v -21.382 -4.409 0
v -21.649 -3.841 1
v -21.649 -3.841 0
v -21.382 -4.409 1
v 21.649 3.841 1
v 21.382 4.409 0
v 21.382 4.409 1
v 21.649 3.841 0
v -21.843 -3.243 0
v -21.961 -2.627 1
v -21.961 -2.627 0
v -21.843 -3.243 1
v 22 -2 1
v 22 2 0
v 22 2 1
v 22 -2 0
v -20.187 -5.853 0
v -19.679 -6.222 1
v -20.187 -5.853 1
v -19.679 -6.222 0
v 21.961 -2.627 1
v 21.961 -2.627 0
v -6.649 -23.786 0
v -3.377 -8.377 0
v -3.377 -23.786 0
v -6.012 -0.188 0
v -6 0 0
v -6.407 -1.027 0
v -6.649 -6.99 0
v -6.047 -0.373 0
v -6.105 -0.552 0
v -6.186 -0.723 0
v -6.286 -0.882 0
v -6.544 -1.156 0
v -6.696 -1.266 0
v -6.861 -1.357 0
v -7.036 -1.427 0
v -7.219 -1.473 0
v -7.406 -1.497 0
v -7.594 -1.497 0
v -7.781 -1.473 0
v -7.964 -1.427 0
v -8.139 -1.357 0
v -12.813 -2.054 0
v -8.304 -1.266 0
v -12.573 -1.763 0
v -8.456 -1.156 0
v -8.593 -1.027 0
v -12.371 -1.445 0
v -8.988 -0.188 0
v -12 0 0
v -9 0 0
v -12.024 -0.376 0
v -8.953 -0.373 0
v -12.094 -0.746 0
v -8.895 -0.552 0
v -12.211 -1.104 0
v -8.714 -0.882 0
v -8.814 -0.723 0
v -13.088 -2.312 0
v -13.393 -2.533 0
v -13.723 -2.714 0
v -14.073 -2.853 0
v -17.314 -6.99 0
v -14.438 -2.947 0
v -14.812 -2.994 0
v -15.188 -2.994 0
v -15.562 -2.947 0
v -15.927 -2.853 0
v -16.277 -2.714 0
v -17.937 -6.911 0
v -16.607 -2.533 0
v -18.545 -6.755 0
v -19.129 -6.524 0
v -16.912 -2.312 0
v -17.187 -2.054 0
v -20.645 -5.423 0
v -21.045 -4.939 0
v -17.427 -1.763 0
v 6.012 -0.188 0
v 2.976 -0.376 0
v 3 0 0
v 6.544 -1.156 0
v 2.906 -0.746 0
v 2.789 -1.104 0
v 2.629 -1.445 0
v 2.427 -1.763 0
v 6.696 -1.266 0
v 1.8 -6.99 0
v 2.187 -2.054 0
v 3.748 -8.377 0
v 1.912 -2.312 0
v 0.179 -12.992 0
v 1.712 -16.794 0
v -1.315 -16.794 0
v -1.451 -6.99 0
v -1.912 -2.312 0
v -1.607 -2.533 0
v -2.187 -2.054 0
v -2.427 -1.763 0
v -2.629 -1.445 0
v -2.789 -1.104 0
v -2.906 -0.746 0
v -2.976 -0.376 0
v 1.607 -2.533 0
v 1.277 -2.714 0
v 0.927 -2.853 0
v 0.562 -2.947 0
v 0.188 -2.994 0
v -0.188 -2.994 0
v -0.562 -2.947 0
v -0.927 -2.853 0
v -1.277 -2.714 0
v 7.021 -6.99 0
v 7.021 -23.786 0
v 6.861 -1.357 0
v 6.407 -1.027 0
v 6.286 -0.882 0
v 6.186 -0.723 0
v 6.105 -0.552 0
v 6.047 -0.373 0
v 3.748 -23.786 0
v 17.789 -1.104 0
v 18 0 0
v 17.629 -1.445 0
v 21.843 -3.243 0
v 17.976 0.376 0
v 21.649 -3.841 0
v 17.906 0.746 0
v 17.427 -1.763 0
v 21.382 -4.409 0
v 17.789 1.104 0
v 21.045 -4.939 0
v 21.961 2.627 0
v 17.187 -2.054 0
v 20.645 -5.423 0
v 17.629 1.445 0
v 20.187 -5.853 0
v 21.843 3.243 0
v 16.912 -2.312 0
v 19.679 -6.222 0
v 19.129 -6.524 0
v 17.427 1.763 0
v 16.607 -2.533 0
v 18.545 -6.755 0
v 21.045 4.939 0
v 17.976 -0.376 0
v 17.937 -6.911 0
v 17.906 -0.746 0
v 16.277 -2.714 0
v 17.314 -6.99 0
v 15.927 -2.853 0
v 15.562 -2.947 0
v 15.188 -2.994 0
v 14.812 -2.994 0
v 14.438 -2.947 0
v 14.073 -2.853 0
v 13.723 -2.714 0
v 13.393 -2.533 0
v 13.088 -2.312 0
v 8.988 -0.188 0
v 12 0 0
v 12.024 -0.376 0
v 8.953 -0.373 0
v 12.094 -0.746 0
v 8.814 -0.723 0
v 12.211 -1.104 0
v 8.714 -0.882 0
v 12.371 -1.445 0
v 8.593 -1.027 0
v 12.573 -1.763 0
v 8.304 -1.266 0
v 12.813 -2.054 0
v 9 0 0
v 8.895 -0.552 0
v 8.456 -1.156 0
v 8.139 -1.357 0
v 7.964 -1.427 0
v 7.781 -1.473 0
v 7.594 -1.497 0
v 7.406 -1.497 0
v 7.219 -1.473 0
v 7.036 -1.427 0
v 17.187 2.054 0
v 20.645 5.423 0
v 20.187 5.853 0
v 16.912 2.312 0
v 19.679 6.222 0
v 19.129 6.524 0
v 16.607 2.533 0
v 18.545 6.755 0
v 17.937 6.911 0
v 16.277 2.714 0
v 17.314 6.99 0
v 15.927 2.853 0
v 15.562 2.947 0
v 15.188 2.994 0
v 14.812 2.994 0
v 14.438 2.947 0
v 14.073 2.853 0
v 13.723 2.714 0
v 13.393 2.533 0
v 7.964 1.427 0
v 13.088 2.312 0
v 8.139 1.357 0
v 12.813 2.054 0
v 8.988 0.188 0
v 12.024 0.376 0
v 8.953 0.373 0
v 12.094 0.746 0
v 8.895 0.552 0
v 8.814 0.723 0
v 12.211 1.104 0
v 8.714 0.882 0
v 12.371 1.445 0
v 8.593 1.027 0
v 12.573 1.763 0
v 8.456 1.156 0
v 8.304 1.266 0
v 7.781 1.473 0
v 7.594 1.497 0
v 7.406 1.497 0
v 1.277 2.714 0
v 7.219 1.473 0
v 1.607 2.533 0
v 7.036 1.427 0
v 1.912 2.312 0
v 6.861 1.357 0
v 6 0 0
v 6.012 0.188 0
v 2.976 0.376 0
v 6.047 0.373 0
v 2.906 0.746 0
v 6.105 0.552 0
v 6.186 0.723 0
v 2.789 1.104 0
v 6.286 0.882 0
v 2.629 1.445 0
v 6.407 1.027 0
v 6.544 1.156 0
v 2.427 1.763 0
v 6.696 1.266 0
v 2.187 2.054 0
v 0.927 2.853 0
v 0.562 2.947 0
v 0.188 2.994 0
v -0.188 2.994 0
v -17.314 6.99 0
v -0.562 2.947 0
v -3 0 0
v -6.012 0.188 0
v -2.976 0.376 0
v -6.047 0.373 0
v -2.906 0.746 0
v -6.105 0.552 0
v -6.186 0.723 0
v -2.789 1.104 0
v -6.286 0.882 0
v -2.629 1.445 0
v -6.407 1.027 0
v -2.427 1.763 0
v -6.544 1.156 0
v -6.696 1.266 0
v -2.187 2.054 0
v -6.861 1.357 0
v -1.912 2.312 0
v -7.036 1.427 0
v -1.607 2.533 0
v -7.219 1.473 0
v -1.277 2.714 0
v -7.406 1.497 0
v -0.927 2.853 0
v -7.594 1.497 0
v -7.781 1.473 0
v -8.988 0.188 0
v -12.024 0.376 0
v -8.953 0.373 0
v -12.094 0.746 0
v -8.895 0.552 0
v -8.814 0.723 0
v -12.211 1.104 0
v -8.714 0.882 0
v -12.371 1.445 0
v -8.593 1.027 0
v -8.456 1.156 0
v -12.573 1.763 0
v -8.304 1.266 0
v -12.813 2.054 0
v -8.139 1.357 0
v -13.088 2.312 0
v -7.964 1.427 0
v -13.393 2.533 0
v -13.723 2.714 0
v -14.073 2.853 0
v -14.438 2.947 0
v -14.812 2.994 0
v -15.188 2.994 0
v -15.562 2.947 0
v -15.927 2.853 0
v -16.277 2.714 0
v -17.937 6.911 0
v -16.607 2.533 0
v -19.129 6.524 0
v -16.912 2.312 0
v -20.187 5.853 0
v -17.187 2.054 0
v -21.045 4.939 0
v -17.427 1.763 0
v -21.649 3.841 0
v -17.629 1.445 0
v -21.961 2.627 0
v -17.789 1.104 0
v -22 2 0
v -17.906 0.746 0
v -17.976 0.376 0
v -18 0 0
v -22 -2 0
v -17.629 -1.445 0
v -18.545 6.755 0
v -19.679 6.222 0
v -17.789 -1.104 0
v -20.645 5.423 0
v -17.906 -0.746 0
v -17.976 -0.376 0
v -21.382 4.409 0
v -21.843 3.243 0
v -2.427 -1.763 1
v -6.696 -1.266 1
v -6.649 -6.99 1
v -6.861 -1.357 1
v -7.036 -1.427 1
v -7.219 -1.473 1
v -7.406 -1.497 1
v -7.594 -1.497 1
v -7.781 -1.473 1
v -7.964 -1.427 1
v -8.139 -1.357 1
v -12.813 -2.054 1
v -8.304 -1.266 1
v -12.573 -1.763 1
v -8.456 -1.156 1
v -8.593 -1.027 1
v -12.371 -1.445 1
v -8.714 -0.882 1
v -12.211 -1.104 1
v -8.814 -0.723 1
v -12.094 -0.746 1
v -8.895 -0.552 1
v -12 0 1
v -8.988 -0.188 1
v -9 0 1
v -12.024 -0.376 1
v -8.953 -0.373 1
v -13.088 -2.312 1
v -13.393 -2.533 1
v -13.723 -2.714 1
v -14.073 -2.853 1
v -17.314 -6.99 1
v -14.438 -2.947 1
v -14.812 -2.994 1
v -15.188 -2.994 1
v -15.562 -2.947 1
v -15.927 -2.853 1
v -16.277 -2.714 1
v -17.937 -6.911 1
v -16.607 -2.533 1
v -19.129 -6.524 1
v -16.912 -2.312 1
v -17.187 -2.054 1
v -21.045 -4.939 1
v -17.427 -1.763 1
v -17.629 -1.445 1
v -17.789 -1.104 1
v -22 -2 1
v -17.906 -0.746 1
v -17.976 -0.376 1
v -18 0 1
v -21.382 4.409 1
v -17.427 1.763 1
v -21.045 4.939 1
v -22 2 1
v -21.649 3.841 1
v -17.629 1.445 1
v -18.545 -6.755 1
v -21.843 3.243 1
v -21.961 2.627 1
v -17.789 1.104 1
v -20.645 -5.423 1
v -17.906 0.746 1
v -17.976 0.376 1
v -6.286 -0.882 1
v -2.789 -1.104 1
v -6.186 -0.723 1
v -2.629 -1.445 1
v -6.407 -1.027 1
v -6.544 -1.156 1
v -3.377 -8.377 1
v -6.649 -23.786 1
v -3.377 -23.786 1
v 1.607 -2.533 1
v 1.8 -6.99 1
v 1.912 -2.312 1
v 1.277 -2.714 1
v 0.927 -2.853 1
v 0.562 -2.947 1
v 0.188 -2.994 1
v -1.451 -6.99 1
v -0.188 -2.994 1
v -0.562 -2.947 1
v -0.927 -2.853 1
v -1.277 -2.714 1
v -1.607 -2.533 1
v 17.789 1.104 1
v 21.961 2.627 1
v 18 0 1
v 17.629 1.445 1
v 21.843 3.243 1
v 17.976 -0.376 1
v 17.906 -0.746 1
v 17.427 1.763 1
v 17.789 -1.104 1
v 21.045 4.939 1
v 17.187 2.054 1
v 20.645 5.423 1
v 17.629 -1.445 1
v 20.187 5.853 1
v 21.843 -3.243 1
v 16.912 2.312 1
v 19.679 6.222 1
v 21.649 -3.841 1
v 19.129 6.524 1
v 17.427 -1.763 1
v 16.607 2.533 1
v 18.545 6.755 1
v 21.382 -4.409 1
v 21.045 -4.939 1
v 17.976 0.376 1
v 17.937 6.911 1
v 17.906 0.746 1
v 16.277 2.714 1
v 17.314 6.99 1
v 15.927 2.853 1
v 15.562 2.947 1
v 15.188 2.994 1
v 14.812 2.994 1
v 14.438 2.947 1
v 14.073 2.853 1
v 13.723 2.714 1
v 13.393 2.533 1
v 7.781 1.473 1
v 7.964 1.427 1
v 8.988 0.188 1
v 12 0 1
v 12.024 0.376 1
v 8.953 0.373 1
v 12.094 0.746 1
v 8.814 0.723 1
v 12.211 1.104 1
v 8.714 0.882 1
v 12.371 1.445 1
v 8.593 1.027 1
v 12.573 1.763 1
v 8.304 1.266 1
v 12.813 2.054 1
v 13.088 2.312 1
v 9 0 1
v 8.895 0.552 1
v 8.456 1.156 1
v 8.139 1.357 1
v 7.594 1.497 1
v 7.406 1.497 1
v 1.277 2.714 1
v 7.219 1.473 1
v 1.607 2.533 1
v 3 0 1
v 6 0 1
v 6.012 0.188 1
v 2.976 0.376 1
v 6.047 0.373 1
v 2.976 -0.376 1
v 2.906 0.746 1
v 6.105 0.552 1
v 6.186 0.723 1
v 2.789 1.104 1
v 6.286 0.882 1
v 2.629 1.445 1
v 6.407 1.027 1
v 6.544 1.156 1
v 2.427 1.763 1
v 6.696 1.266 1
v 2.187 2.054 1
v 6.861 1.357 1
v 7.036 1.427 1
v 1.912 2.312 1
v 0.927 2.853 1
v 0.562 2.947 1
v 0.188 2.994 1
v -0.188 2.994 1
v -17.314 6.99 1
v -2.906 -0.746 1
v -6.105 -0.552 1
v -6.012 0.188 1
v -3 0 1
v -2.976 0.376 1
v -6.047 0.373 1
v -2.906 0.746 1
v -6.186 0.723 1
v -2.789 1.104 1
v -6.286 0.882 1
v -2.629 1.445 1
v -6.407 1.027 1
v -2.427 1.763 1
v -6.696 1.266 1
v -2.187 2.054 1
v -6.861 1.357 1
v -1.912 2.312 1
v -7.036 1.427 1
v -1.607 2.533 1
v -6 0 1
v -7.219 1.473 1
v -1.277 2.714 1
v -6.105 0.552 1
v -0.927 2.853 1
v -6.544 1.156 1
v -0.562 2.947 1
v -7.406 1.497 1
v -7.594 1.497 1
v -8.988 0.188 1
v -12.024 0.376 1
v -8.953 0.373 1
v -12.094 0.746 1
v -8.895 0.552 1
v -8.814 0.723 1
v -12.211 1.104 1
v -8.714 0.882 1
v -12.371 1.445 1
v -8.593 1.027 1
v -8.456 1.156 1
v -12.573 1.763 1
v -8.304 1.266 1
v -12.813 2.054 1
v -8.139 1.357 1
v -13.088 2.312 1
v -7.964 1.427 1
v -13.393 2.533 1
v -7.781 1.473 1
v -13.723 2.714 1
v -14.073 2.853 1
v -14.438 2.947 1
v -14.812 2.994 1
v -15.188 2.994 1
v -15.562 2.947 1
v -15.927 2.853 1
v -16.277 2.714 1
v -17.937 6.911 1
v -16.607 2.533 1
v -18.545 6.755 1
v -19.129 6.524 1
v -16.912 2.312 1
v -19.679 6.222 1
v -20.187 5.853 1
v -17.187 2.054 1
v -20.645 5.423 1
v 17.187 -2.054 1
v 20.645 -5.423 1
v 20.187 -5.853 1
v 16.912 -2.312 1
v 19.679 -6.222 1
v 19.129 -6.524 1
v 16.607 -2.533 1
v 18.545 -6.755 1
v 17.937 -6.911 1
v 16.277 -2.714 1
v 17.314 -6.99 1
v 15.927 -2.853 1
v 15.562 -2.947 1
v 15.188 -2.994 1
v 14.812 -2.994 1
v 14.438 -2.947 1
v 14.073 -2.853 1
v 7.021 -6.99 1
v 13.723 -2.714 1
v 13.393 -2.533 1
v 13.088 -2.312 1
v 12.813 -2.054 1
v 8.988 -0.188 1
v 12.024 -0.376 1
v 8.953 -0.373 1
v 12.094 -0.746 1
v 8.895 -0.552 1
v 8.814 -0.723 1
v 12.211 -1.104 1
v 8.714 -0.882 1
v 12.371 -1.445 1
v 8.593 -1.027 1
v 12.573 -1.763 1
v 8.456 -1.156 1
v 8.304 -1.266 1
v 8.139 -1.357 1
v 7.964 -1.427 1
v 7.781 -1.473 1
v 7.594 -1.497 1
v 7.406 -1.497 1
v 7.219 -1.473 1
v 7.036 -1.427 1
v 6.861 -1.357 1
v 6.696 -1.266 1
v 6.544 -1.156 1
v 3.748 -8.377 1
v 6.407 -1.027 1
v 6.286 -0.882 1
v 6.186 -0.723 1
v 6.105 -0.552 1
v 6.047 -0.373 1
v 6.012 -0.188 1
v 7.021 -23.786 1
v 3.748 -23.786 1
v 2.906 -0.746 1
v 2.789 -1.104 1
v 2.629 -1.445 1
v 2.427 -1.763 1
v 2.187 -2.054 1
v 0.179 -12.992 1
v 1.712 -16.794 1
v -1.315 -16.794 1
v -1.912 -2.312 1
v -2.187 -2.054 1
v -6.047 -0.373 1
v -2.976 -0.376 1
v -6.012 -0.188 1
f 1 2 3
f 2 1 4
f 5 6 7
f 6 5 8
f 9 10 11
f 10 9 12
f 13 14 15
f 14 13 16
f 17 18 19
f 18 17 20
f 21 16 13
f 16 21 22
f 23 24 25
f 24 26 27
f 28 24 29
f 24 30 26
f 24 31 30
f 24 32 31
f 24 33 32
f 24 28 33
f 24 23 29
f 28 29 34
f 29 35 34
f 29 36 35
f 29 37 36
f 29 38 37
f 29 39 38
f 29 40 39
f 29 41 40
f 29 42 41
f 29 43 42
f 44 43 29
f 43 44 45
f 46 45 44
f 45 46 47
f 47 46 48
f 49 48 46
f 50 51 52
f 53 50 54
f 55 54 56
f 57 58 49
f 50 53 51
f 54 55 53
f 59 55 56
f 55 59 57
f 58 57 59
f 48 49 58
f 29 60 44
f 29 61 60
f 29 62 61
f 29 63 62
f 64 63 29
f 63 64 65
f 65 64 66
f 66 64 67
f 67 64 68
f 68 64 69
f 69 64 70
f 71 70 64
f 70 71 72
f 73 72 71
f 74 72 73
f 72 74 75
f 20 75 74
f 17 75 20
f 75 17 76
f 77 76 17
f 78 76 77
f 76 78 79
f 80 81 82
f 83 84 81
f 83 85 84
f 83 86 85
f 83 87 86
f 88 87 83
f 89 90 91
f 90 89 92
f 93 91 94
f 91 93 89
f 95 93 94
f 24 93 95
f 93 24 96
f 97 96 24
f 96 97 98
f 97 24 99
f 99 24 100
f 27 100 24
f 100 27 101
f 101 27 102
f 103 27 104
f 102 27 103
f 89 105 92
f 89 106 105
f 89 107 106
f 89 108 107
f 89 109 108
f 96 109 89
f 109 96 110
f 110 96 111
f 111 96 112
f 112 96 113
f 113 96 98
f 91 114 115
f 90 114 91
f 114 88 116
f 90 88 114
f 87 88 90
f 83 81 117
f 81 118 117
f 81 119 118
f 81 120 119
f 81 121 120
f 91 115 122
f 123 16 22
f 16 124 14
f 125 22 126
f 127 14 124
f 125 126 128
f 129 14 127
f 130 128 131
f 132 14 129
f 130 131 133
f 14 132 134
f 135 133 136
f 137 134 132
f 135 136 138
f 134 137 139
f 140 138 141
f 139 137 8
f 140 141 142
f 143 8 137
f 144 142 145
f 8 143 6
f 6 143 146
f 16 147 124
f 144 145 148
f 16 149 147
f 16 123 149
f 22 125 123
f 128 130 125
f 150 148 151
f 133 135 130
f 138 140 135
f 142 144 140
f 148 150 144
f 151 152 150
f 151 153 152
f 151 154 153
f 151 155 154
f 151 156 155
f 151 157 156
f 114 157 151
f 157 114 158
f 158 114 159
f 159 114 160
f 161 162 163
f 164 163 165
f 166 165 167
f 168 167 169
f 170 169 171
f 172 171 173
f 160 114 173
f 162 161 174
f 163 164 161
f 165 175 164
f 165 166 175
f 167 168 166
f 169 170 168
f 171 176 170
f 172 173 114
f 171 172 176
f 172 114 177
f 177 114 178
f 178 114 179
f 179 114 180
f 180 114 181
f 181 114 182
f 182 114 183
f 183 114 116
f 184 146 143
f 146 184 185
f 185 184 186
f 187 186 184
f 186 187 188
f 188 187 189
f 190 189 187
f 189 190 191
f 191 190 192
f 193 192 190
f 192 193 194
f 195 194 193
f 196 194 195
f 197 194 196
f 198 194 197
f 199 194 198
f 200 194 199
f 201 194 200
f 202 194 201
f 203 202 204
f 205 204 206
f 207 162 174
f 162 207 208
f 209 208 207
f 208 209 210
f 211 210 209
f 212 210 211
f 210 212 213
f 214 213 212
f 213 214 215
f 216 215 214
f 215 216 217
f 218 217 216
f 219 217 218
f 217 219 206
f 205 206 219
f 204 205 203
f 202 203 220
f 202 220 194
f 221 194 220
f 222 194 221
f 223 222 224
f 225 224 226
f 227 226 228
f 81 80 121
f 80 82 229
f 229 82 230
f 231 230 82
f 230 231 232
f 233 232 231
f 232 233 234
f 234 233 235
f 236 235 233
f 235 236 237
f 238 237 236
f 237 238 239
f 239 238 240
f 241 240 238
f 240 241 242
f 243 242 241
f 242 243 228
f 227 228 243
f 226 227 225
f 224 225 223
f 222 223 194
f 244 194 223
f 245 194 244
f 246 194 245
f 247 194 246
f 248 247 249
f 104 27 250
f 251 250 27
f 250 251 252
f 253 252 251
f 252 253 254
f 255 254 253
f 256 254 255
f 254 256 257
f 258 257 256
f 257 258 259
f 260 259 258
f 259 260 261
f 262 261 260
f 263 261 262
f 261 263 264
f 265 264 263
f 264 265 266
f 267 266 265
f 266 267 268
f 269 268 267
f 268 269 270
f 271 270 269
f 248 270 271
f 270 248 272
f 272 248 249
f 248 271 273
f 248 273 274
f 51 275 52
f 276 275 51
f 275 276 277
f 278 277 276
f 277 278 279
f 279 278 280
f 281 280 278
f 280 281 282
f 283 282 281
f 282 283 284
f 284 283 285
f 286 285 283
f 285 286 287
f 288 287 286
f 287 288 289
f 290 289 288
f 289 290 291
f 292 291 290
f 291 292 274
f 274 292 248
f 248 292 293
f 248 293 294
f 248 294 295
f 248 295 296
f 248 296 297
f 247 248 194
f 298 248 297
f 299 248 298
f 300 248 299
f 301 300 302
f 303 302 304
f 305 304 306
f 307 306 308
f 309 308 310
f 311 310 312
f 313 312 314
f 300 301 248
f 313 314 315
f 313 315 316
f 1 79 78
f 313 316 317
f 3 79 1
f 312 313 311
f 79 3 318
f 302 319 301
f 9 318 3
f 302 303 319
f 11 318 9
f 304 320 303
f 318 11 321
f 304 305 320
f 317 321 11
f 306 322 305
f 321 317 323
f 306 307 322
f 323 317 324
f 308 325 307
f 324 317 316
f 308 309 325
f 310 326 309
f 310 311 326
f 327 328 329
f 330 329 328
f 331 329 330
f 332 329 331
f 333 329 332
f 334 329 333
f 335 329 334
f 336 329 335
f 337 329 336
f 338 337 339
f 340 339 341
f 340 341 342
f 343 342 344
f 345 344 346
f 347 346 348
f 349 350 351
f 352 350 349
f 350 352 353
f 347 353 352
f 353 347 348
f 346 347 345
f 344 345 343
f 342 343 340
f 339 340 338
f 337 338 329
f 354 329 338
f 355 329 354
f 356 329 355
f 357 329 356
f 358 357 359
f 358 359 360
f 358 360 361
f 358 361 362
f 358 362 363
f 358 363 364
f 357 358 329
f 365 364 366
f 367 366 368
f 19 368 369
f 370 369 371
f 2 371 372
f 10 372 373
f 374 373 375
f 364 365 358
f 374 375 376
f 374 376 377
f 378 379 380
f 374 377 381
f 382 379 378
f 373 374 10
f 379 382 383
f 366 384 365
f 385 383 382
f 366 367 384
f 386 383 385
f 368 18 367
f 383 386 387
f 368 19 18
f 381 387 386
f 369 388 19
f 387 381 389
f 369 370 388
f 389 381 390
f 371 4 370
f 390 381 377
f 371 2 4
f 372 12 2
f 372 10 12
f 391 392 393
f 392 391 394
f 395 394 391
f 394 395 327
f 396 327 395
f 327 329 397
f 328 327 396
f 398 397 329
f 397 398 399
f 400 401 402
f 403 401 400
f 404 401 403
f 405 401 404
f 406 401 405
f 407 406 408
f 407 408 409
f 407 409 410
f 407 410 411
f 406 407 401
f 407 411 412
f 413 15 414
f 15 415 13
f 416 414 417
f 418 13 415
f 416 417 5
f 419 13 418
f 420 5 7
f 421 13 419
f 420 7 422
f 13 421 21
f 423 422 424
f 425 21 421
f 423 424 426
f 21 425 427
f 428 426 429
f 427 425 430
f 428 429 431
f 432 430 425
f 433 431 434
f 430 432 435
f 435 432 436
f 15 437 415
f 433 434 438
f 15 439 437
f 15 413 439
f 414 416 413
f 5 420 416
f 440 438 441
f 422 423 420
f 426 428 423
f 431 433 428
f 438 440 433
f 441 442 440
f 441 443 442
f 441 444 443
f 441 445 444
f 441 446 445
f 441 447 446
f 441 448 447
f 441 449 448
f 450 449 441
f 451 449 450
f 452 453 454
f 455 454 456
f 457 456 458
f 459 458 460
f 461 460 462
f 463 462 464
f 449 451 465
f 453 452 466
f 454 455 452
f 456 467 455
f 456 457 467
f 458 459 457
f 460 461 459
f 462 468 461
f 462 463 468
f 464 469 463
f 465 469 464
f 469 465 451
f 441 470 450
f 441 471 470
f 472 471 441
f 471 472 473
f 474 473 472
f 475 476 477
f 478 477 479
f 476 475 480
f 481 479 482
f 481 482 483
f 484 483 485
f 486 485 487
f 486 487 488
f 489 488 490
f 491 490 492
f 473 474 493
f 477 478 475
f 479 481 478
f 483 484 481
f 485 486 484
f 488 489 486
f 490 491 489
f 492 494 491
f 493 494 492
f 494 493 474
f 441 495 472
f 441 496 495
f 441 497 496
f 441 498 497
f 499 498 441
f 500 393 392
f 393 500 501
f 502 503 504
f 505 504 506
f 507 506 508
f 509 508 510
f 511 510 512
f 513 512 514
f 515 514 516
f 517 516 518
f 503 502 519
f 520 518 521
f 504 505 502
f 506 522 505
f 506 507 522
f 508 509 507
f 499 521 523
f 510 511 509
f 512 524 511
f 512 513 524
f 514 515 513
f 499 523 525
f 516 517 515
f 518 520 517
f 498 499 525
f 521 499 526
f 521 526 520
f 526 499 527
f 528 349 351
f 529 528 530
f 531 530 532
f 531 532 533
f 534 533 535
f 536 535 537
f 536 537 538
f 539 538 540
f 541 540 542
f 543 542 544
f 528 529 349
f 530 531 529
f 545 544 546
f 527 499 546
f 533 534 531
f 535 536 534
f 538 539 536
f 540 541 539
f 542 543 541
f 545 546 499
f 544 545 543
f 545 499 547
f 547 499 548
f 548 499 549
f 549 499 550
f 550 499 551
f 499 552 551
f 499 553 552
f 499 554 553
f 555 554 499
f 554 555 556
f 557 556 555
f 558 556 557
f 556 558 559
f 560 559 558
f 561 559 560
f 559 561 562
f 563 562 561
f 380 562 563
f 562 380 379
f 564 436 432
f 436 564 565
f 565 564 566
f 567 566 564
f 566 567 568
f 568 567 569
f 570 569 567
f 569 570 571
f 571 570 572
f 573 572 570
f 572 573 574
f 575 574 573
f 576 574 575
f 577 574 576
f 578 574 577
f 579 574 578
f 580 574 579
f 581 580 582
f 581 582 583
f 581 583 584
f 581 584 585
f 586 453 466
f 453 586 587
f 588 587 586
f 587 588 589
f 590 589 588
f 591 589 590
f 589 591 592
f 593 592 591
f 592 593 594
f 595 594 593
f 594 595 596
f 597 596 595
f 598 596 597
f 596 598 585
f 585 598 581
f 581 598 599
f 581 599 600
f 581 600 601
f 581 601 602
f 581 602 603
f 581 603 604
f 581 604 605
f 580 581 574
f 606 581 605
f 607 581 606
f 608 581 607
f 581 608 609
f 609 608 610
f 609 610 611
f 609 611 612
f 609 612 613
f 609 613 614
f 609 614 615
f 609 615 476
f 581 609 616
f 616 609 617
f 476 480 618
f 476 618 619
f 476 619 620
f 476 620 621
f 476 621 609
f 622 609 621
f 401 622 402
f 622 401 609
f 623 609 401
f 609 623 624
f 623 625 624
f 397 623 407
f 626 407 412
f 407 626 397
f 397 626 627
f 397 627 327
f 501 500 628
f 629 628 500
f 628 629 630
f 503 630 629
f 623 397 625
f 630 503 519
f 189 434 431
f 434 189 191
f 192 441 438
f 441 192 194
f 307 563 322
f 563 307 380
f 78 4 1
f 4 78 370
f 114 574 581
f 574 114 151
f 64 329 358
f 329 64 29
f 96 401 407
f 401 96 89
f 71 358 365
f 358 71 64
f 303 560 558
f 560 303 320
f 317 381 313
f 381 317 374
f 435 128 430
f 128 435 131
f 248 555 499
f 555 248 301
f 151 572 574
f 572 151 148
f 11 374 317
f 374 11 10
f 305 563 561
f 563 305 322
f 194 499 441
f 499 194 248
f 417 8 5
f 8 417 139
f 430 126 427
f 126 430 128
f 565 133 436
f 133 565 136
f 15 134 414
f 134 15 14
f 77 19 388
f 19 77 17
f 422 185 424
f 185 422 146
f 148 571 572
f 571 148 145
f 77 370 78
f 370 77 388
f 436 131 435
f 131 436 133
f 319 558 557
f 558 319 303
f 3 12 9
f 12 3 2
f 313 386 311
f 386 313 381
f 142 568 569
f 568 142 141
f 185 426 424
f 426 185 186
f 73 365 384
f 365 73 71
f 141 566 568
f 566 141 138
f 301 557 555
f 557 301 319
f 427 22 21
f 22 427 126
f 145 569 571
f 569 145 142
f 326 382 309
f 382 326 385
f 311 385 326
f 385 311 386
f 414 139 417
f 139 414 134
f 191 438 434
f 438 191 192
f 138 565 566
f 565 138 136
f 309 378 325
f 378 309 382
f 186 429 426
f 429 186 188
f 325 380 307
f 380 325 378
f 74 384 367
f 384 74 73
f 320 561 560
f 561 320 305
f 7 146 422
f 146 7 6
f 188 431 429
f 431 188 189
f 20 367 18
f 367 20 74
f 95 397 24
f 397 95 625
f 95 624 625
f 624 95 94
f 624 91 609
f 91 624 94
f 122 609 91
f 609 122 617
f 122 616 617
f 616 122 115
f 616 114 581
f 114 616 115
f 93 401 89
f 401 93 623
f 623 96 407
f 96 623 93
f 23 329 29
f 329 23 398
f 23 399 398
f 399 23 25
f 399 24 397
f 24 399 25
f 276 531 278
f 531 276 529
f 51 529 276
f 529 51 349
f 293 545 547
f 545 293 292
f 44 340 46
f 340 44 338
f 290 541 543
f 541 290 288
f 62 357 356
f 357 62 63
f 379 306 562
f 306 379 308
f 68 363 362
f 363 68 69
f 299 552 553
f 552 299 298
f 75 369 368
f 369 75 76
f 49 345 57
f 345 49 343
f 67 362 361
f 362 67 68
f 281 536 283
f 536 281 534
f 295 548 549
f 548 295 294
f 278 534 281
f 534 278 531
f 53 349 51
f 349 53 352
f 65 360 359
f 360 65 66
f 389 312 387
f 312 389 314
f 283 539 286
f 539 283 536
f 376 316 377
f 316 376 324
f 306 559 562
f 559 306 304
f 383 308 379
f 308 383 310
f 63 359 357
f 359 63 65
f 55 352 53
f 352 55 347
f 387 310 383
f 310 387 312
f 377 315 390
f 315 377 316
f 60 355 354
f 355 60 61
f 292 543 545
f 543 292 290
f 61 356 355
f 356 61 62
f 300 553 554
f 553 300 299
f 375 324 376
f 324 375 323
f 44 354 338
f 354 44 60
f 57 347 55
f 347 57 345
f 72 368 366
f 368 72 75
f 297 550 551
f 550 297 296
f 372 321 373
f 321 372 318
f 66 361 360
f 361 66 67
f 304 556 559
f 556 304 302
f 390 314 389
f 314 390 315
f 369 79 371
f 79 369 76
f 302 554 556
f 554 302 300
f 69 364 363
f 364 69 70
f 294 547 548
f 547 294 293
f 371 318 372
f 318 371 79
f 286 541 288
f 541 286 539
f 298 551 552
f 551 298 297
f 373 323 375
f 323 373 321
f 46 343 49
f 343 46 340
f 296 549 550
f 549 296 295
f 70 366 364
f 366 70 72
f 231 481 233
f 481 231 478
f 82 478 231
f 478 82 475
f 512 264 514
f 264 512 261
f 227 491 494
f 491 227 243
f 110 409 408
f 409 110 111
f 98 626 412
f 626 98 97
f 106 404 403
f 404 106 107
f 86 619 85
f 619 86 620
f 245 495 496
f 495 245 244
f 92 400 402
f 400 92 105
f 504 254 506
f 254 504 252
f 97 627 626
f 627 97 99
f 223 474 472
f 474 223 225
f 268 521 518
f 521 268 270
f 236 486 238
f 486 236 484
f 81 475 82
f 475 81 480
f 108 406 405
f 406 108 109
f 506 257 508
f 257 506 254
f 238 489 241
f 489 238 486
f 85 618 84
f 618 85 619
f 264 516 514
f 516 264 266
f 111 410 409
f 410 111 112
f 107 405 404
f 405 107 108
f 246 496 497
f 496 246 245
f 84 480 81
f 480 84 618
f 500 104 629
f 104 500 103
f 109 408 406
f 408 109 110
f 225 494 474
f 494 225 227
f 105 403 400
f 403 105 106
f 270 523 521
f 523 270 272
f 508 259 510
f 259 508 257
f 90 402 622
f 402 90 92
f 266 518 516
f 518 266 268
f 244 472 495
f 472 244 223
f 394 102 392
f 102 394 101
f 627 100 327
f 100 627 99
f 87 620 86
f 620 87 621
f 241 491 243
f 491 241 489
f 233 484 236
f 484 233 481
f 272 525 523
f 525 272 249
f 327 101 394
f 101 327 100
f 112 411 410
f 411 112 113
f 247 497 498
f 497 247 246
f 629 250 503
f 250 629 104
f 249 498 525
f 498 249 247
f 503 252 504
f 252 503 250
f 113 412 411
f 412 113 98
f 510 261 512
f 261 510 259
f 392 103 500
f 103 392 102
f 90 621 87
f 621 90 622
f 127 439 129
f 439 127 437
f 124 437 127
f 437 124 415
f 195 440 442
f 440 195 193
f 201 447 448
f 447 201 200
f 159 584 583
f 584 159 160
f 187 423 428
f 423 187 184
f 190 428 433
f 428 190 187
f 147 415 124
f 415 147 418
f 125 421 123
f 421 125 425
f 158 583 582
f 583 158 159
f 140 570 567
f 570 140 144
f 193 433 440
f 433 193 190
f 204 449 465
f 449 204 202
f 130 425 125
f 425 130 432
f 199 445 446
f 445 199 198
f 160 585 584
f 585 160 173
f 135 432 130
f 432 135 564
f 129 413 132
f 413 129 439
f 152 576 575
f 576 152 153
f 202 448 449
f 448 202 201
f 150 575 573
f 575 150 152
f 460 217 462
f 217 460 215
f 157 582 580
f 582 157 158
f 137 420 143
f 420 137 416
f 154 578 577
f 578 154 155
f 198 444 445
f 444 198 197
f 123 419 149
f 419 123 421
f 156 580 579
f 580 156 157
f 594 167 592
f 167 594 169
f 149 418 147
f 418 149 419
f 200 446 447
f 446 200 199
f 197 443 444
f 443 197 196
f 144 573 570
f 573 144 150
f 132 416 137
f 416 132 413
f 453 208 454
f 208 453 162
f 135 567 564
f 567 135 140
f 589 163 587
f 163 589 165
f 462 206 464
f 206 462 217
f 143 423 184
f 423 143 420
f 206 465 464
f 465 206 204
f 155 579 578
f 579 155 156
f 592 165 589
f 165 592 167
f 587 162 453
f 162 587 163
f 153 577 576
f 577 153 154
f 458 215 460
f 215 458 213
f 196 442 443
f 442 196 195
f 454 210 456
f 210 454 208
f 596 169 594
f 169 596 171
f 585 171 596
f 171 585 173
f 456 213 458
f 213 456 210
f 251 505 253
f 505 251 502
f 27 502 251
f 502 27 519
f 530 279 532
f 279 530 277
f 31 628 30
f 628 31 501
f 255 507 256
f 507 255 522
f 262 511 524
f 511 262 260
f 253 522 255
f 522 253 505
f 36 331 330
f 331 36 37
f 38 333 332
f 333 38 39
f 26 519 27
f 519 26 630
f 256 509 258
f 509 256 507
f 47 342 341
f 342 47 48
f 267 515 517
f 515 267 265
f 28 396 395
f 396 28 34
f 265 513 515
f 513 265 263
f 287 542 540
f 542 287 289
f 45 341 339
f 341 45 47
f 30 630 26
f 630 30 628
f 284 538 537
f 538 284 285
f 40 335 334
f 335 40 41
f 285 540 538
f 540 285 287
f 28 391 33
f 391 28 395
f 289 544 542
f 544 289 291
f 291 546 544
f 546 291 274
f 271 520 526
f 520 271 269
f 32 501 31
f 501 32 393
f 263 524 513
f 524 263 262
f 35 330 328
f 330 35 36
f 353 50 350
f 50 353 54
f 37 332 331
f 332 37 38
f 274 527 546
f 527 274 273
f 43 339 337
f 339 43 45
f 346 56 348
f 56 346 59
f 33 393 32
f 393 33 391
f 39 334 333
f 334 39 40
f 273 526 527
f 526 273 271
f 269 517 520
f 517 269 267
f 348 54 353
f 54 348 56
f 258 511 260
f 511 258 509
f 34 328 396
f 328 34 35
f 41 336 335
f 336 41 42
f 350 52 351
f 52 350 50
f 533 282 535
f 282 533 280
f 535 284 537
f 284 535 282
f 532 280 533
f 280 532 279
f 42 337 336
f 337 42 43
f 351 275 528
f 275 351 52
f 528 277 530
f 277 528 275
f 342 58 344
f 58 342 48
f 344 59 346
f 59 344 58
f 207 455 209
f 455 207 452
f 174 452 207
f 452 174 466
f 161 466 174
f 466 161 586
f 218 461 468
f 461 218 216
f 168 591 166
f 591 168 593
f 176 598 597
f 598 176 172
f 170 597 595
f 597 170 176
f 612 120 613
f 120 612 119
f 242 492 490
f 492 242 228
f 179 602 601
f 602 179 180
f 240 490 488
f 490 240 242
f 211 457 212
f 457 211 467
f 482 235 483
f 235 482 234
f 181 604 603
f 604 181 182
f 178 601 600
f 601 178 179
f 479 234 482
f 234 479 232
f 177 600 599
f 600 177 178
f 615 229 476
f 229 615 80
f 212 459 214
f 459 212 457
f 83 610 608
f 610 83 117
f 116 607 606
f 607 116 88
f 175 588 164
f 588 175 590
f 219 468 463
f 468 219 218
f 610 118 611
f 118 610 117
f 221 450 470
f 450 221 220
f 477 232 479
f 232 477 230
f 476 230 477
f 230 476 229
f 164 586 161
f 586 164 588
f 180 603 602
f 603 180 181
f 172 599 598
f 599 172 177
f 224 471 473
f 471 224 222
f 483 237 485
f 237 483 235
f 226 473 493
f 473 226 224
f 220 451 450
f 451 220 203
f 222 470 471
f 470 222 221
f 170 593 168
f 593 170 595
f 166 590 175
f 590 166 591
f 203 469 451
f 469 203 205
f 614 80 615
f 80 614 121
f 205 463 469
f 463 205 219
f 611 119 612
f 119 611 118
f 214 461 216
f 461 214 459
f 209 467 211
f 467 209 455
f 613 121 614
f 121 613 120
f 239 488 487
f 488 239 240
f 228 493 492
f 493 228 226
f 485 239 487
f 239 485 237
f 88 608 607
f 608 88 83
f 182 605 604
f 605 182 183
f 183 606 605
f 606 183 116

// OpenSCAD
$fn = 50;


difference() {
	union() {
		hull() {
			translate(v = [-17.0000000000, 2.0000000000, 0]) {
				cylinder(h = 1, r = 5);
			}
			translate(v = [17.0000000000, 2.0000000000, 0]) {
				cylinder(h = 1, r = 5);
			}
			translate(v = [-17.0000000000, -2.0000000000, 0]) {
				cylinder(h = 1, r = 5);
			}
			translate(v = [17.0000000000, -2.0000000000, 0]) {
				cylinder(h = 1, r = 5);
			}
		}
		translate(v = [0, -5, 0]) {
			linear_extrude(height = 1) {
				text(font = "DejaVu Sans Mono:style=Bold", halign = "center", size = 19.0000000000, text = "M", valign = "top");
			}
		}
	}
	union() {
		translate(v = [-15.0000000000, 0.0000000000, 0]) {
			translate(v = [0, 0, -100]) {
				cylinder(h = 200, r = 3.0000000000);
			}
		}
		translate(v = [0, 0, -100]) {
			cylinder(h = 200, r = 3.0000000000);
		}
		translate(v = [15.0000000000, 0.0000000000, 0]) {
			translate(v = [0, 0, -100]) {
				cylinder(h = 200, r = 3.0000000000);
			}
		}
		translate(v = [-15.0000000000, 0.0000000000, 0]) {
			translate(v = [0, 0, -100]) {
				cylinder(h = 200, r = 1.5000000000);
			}
		}
		translate(v = [-7.5000000000, 0.0000000000, 0]) {
			translate(v = [0, 0, -100]) {
				cylinder(h = 200, r = 1.5000000000);
			}
		}
		translate(v = [0, 0, -100]) {
			cylinder(h = 200, r = 1.5000000000);
		}
		translate(v = [7.5000000000, 0.0000000000, 0]) {
			translate(v = [0, 0, -100]) {
				cylinder(h = 200, r = 1.5000000000);
			}
		}
		translate(v = [15.0000000000, 0.0000000000, 0]) {
			translate(v = [0, 0, -100]) {
				cylinder(h = 200, r = 1.5000000000);
			}
		}
	}
}
